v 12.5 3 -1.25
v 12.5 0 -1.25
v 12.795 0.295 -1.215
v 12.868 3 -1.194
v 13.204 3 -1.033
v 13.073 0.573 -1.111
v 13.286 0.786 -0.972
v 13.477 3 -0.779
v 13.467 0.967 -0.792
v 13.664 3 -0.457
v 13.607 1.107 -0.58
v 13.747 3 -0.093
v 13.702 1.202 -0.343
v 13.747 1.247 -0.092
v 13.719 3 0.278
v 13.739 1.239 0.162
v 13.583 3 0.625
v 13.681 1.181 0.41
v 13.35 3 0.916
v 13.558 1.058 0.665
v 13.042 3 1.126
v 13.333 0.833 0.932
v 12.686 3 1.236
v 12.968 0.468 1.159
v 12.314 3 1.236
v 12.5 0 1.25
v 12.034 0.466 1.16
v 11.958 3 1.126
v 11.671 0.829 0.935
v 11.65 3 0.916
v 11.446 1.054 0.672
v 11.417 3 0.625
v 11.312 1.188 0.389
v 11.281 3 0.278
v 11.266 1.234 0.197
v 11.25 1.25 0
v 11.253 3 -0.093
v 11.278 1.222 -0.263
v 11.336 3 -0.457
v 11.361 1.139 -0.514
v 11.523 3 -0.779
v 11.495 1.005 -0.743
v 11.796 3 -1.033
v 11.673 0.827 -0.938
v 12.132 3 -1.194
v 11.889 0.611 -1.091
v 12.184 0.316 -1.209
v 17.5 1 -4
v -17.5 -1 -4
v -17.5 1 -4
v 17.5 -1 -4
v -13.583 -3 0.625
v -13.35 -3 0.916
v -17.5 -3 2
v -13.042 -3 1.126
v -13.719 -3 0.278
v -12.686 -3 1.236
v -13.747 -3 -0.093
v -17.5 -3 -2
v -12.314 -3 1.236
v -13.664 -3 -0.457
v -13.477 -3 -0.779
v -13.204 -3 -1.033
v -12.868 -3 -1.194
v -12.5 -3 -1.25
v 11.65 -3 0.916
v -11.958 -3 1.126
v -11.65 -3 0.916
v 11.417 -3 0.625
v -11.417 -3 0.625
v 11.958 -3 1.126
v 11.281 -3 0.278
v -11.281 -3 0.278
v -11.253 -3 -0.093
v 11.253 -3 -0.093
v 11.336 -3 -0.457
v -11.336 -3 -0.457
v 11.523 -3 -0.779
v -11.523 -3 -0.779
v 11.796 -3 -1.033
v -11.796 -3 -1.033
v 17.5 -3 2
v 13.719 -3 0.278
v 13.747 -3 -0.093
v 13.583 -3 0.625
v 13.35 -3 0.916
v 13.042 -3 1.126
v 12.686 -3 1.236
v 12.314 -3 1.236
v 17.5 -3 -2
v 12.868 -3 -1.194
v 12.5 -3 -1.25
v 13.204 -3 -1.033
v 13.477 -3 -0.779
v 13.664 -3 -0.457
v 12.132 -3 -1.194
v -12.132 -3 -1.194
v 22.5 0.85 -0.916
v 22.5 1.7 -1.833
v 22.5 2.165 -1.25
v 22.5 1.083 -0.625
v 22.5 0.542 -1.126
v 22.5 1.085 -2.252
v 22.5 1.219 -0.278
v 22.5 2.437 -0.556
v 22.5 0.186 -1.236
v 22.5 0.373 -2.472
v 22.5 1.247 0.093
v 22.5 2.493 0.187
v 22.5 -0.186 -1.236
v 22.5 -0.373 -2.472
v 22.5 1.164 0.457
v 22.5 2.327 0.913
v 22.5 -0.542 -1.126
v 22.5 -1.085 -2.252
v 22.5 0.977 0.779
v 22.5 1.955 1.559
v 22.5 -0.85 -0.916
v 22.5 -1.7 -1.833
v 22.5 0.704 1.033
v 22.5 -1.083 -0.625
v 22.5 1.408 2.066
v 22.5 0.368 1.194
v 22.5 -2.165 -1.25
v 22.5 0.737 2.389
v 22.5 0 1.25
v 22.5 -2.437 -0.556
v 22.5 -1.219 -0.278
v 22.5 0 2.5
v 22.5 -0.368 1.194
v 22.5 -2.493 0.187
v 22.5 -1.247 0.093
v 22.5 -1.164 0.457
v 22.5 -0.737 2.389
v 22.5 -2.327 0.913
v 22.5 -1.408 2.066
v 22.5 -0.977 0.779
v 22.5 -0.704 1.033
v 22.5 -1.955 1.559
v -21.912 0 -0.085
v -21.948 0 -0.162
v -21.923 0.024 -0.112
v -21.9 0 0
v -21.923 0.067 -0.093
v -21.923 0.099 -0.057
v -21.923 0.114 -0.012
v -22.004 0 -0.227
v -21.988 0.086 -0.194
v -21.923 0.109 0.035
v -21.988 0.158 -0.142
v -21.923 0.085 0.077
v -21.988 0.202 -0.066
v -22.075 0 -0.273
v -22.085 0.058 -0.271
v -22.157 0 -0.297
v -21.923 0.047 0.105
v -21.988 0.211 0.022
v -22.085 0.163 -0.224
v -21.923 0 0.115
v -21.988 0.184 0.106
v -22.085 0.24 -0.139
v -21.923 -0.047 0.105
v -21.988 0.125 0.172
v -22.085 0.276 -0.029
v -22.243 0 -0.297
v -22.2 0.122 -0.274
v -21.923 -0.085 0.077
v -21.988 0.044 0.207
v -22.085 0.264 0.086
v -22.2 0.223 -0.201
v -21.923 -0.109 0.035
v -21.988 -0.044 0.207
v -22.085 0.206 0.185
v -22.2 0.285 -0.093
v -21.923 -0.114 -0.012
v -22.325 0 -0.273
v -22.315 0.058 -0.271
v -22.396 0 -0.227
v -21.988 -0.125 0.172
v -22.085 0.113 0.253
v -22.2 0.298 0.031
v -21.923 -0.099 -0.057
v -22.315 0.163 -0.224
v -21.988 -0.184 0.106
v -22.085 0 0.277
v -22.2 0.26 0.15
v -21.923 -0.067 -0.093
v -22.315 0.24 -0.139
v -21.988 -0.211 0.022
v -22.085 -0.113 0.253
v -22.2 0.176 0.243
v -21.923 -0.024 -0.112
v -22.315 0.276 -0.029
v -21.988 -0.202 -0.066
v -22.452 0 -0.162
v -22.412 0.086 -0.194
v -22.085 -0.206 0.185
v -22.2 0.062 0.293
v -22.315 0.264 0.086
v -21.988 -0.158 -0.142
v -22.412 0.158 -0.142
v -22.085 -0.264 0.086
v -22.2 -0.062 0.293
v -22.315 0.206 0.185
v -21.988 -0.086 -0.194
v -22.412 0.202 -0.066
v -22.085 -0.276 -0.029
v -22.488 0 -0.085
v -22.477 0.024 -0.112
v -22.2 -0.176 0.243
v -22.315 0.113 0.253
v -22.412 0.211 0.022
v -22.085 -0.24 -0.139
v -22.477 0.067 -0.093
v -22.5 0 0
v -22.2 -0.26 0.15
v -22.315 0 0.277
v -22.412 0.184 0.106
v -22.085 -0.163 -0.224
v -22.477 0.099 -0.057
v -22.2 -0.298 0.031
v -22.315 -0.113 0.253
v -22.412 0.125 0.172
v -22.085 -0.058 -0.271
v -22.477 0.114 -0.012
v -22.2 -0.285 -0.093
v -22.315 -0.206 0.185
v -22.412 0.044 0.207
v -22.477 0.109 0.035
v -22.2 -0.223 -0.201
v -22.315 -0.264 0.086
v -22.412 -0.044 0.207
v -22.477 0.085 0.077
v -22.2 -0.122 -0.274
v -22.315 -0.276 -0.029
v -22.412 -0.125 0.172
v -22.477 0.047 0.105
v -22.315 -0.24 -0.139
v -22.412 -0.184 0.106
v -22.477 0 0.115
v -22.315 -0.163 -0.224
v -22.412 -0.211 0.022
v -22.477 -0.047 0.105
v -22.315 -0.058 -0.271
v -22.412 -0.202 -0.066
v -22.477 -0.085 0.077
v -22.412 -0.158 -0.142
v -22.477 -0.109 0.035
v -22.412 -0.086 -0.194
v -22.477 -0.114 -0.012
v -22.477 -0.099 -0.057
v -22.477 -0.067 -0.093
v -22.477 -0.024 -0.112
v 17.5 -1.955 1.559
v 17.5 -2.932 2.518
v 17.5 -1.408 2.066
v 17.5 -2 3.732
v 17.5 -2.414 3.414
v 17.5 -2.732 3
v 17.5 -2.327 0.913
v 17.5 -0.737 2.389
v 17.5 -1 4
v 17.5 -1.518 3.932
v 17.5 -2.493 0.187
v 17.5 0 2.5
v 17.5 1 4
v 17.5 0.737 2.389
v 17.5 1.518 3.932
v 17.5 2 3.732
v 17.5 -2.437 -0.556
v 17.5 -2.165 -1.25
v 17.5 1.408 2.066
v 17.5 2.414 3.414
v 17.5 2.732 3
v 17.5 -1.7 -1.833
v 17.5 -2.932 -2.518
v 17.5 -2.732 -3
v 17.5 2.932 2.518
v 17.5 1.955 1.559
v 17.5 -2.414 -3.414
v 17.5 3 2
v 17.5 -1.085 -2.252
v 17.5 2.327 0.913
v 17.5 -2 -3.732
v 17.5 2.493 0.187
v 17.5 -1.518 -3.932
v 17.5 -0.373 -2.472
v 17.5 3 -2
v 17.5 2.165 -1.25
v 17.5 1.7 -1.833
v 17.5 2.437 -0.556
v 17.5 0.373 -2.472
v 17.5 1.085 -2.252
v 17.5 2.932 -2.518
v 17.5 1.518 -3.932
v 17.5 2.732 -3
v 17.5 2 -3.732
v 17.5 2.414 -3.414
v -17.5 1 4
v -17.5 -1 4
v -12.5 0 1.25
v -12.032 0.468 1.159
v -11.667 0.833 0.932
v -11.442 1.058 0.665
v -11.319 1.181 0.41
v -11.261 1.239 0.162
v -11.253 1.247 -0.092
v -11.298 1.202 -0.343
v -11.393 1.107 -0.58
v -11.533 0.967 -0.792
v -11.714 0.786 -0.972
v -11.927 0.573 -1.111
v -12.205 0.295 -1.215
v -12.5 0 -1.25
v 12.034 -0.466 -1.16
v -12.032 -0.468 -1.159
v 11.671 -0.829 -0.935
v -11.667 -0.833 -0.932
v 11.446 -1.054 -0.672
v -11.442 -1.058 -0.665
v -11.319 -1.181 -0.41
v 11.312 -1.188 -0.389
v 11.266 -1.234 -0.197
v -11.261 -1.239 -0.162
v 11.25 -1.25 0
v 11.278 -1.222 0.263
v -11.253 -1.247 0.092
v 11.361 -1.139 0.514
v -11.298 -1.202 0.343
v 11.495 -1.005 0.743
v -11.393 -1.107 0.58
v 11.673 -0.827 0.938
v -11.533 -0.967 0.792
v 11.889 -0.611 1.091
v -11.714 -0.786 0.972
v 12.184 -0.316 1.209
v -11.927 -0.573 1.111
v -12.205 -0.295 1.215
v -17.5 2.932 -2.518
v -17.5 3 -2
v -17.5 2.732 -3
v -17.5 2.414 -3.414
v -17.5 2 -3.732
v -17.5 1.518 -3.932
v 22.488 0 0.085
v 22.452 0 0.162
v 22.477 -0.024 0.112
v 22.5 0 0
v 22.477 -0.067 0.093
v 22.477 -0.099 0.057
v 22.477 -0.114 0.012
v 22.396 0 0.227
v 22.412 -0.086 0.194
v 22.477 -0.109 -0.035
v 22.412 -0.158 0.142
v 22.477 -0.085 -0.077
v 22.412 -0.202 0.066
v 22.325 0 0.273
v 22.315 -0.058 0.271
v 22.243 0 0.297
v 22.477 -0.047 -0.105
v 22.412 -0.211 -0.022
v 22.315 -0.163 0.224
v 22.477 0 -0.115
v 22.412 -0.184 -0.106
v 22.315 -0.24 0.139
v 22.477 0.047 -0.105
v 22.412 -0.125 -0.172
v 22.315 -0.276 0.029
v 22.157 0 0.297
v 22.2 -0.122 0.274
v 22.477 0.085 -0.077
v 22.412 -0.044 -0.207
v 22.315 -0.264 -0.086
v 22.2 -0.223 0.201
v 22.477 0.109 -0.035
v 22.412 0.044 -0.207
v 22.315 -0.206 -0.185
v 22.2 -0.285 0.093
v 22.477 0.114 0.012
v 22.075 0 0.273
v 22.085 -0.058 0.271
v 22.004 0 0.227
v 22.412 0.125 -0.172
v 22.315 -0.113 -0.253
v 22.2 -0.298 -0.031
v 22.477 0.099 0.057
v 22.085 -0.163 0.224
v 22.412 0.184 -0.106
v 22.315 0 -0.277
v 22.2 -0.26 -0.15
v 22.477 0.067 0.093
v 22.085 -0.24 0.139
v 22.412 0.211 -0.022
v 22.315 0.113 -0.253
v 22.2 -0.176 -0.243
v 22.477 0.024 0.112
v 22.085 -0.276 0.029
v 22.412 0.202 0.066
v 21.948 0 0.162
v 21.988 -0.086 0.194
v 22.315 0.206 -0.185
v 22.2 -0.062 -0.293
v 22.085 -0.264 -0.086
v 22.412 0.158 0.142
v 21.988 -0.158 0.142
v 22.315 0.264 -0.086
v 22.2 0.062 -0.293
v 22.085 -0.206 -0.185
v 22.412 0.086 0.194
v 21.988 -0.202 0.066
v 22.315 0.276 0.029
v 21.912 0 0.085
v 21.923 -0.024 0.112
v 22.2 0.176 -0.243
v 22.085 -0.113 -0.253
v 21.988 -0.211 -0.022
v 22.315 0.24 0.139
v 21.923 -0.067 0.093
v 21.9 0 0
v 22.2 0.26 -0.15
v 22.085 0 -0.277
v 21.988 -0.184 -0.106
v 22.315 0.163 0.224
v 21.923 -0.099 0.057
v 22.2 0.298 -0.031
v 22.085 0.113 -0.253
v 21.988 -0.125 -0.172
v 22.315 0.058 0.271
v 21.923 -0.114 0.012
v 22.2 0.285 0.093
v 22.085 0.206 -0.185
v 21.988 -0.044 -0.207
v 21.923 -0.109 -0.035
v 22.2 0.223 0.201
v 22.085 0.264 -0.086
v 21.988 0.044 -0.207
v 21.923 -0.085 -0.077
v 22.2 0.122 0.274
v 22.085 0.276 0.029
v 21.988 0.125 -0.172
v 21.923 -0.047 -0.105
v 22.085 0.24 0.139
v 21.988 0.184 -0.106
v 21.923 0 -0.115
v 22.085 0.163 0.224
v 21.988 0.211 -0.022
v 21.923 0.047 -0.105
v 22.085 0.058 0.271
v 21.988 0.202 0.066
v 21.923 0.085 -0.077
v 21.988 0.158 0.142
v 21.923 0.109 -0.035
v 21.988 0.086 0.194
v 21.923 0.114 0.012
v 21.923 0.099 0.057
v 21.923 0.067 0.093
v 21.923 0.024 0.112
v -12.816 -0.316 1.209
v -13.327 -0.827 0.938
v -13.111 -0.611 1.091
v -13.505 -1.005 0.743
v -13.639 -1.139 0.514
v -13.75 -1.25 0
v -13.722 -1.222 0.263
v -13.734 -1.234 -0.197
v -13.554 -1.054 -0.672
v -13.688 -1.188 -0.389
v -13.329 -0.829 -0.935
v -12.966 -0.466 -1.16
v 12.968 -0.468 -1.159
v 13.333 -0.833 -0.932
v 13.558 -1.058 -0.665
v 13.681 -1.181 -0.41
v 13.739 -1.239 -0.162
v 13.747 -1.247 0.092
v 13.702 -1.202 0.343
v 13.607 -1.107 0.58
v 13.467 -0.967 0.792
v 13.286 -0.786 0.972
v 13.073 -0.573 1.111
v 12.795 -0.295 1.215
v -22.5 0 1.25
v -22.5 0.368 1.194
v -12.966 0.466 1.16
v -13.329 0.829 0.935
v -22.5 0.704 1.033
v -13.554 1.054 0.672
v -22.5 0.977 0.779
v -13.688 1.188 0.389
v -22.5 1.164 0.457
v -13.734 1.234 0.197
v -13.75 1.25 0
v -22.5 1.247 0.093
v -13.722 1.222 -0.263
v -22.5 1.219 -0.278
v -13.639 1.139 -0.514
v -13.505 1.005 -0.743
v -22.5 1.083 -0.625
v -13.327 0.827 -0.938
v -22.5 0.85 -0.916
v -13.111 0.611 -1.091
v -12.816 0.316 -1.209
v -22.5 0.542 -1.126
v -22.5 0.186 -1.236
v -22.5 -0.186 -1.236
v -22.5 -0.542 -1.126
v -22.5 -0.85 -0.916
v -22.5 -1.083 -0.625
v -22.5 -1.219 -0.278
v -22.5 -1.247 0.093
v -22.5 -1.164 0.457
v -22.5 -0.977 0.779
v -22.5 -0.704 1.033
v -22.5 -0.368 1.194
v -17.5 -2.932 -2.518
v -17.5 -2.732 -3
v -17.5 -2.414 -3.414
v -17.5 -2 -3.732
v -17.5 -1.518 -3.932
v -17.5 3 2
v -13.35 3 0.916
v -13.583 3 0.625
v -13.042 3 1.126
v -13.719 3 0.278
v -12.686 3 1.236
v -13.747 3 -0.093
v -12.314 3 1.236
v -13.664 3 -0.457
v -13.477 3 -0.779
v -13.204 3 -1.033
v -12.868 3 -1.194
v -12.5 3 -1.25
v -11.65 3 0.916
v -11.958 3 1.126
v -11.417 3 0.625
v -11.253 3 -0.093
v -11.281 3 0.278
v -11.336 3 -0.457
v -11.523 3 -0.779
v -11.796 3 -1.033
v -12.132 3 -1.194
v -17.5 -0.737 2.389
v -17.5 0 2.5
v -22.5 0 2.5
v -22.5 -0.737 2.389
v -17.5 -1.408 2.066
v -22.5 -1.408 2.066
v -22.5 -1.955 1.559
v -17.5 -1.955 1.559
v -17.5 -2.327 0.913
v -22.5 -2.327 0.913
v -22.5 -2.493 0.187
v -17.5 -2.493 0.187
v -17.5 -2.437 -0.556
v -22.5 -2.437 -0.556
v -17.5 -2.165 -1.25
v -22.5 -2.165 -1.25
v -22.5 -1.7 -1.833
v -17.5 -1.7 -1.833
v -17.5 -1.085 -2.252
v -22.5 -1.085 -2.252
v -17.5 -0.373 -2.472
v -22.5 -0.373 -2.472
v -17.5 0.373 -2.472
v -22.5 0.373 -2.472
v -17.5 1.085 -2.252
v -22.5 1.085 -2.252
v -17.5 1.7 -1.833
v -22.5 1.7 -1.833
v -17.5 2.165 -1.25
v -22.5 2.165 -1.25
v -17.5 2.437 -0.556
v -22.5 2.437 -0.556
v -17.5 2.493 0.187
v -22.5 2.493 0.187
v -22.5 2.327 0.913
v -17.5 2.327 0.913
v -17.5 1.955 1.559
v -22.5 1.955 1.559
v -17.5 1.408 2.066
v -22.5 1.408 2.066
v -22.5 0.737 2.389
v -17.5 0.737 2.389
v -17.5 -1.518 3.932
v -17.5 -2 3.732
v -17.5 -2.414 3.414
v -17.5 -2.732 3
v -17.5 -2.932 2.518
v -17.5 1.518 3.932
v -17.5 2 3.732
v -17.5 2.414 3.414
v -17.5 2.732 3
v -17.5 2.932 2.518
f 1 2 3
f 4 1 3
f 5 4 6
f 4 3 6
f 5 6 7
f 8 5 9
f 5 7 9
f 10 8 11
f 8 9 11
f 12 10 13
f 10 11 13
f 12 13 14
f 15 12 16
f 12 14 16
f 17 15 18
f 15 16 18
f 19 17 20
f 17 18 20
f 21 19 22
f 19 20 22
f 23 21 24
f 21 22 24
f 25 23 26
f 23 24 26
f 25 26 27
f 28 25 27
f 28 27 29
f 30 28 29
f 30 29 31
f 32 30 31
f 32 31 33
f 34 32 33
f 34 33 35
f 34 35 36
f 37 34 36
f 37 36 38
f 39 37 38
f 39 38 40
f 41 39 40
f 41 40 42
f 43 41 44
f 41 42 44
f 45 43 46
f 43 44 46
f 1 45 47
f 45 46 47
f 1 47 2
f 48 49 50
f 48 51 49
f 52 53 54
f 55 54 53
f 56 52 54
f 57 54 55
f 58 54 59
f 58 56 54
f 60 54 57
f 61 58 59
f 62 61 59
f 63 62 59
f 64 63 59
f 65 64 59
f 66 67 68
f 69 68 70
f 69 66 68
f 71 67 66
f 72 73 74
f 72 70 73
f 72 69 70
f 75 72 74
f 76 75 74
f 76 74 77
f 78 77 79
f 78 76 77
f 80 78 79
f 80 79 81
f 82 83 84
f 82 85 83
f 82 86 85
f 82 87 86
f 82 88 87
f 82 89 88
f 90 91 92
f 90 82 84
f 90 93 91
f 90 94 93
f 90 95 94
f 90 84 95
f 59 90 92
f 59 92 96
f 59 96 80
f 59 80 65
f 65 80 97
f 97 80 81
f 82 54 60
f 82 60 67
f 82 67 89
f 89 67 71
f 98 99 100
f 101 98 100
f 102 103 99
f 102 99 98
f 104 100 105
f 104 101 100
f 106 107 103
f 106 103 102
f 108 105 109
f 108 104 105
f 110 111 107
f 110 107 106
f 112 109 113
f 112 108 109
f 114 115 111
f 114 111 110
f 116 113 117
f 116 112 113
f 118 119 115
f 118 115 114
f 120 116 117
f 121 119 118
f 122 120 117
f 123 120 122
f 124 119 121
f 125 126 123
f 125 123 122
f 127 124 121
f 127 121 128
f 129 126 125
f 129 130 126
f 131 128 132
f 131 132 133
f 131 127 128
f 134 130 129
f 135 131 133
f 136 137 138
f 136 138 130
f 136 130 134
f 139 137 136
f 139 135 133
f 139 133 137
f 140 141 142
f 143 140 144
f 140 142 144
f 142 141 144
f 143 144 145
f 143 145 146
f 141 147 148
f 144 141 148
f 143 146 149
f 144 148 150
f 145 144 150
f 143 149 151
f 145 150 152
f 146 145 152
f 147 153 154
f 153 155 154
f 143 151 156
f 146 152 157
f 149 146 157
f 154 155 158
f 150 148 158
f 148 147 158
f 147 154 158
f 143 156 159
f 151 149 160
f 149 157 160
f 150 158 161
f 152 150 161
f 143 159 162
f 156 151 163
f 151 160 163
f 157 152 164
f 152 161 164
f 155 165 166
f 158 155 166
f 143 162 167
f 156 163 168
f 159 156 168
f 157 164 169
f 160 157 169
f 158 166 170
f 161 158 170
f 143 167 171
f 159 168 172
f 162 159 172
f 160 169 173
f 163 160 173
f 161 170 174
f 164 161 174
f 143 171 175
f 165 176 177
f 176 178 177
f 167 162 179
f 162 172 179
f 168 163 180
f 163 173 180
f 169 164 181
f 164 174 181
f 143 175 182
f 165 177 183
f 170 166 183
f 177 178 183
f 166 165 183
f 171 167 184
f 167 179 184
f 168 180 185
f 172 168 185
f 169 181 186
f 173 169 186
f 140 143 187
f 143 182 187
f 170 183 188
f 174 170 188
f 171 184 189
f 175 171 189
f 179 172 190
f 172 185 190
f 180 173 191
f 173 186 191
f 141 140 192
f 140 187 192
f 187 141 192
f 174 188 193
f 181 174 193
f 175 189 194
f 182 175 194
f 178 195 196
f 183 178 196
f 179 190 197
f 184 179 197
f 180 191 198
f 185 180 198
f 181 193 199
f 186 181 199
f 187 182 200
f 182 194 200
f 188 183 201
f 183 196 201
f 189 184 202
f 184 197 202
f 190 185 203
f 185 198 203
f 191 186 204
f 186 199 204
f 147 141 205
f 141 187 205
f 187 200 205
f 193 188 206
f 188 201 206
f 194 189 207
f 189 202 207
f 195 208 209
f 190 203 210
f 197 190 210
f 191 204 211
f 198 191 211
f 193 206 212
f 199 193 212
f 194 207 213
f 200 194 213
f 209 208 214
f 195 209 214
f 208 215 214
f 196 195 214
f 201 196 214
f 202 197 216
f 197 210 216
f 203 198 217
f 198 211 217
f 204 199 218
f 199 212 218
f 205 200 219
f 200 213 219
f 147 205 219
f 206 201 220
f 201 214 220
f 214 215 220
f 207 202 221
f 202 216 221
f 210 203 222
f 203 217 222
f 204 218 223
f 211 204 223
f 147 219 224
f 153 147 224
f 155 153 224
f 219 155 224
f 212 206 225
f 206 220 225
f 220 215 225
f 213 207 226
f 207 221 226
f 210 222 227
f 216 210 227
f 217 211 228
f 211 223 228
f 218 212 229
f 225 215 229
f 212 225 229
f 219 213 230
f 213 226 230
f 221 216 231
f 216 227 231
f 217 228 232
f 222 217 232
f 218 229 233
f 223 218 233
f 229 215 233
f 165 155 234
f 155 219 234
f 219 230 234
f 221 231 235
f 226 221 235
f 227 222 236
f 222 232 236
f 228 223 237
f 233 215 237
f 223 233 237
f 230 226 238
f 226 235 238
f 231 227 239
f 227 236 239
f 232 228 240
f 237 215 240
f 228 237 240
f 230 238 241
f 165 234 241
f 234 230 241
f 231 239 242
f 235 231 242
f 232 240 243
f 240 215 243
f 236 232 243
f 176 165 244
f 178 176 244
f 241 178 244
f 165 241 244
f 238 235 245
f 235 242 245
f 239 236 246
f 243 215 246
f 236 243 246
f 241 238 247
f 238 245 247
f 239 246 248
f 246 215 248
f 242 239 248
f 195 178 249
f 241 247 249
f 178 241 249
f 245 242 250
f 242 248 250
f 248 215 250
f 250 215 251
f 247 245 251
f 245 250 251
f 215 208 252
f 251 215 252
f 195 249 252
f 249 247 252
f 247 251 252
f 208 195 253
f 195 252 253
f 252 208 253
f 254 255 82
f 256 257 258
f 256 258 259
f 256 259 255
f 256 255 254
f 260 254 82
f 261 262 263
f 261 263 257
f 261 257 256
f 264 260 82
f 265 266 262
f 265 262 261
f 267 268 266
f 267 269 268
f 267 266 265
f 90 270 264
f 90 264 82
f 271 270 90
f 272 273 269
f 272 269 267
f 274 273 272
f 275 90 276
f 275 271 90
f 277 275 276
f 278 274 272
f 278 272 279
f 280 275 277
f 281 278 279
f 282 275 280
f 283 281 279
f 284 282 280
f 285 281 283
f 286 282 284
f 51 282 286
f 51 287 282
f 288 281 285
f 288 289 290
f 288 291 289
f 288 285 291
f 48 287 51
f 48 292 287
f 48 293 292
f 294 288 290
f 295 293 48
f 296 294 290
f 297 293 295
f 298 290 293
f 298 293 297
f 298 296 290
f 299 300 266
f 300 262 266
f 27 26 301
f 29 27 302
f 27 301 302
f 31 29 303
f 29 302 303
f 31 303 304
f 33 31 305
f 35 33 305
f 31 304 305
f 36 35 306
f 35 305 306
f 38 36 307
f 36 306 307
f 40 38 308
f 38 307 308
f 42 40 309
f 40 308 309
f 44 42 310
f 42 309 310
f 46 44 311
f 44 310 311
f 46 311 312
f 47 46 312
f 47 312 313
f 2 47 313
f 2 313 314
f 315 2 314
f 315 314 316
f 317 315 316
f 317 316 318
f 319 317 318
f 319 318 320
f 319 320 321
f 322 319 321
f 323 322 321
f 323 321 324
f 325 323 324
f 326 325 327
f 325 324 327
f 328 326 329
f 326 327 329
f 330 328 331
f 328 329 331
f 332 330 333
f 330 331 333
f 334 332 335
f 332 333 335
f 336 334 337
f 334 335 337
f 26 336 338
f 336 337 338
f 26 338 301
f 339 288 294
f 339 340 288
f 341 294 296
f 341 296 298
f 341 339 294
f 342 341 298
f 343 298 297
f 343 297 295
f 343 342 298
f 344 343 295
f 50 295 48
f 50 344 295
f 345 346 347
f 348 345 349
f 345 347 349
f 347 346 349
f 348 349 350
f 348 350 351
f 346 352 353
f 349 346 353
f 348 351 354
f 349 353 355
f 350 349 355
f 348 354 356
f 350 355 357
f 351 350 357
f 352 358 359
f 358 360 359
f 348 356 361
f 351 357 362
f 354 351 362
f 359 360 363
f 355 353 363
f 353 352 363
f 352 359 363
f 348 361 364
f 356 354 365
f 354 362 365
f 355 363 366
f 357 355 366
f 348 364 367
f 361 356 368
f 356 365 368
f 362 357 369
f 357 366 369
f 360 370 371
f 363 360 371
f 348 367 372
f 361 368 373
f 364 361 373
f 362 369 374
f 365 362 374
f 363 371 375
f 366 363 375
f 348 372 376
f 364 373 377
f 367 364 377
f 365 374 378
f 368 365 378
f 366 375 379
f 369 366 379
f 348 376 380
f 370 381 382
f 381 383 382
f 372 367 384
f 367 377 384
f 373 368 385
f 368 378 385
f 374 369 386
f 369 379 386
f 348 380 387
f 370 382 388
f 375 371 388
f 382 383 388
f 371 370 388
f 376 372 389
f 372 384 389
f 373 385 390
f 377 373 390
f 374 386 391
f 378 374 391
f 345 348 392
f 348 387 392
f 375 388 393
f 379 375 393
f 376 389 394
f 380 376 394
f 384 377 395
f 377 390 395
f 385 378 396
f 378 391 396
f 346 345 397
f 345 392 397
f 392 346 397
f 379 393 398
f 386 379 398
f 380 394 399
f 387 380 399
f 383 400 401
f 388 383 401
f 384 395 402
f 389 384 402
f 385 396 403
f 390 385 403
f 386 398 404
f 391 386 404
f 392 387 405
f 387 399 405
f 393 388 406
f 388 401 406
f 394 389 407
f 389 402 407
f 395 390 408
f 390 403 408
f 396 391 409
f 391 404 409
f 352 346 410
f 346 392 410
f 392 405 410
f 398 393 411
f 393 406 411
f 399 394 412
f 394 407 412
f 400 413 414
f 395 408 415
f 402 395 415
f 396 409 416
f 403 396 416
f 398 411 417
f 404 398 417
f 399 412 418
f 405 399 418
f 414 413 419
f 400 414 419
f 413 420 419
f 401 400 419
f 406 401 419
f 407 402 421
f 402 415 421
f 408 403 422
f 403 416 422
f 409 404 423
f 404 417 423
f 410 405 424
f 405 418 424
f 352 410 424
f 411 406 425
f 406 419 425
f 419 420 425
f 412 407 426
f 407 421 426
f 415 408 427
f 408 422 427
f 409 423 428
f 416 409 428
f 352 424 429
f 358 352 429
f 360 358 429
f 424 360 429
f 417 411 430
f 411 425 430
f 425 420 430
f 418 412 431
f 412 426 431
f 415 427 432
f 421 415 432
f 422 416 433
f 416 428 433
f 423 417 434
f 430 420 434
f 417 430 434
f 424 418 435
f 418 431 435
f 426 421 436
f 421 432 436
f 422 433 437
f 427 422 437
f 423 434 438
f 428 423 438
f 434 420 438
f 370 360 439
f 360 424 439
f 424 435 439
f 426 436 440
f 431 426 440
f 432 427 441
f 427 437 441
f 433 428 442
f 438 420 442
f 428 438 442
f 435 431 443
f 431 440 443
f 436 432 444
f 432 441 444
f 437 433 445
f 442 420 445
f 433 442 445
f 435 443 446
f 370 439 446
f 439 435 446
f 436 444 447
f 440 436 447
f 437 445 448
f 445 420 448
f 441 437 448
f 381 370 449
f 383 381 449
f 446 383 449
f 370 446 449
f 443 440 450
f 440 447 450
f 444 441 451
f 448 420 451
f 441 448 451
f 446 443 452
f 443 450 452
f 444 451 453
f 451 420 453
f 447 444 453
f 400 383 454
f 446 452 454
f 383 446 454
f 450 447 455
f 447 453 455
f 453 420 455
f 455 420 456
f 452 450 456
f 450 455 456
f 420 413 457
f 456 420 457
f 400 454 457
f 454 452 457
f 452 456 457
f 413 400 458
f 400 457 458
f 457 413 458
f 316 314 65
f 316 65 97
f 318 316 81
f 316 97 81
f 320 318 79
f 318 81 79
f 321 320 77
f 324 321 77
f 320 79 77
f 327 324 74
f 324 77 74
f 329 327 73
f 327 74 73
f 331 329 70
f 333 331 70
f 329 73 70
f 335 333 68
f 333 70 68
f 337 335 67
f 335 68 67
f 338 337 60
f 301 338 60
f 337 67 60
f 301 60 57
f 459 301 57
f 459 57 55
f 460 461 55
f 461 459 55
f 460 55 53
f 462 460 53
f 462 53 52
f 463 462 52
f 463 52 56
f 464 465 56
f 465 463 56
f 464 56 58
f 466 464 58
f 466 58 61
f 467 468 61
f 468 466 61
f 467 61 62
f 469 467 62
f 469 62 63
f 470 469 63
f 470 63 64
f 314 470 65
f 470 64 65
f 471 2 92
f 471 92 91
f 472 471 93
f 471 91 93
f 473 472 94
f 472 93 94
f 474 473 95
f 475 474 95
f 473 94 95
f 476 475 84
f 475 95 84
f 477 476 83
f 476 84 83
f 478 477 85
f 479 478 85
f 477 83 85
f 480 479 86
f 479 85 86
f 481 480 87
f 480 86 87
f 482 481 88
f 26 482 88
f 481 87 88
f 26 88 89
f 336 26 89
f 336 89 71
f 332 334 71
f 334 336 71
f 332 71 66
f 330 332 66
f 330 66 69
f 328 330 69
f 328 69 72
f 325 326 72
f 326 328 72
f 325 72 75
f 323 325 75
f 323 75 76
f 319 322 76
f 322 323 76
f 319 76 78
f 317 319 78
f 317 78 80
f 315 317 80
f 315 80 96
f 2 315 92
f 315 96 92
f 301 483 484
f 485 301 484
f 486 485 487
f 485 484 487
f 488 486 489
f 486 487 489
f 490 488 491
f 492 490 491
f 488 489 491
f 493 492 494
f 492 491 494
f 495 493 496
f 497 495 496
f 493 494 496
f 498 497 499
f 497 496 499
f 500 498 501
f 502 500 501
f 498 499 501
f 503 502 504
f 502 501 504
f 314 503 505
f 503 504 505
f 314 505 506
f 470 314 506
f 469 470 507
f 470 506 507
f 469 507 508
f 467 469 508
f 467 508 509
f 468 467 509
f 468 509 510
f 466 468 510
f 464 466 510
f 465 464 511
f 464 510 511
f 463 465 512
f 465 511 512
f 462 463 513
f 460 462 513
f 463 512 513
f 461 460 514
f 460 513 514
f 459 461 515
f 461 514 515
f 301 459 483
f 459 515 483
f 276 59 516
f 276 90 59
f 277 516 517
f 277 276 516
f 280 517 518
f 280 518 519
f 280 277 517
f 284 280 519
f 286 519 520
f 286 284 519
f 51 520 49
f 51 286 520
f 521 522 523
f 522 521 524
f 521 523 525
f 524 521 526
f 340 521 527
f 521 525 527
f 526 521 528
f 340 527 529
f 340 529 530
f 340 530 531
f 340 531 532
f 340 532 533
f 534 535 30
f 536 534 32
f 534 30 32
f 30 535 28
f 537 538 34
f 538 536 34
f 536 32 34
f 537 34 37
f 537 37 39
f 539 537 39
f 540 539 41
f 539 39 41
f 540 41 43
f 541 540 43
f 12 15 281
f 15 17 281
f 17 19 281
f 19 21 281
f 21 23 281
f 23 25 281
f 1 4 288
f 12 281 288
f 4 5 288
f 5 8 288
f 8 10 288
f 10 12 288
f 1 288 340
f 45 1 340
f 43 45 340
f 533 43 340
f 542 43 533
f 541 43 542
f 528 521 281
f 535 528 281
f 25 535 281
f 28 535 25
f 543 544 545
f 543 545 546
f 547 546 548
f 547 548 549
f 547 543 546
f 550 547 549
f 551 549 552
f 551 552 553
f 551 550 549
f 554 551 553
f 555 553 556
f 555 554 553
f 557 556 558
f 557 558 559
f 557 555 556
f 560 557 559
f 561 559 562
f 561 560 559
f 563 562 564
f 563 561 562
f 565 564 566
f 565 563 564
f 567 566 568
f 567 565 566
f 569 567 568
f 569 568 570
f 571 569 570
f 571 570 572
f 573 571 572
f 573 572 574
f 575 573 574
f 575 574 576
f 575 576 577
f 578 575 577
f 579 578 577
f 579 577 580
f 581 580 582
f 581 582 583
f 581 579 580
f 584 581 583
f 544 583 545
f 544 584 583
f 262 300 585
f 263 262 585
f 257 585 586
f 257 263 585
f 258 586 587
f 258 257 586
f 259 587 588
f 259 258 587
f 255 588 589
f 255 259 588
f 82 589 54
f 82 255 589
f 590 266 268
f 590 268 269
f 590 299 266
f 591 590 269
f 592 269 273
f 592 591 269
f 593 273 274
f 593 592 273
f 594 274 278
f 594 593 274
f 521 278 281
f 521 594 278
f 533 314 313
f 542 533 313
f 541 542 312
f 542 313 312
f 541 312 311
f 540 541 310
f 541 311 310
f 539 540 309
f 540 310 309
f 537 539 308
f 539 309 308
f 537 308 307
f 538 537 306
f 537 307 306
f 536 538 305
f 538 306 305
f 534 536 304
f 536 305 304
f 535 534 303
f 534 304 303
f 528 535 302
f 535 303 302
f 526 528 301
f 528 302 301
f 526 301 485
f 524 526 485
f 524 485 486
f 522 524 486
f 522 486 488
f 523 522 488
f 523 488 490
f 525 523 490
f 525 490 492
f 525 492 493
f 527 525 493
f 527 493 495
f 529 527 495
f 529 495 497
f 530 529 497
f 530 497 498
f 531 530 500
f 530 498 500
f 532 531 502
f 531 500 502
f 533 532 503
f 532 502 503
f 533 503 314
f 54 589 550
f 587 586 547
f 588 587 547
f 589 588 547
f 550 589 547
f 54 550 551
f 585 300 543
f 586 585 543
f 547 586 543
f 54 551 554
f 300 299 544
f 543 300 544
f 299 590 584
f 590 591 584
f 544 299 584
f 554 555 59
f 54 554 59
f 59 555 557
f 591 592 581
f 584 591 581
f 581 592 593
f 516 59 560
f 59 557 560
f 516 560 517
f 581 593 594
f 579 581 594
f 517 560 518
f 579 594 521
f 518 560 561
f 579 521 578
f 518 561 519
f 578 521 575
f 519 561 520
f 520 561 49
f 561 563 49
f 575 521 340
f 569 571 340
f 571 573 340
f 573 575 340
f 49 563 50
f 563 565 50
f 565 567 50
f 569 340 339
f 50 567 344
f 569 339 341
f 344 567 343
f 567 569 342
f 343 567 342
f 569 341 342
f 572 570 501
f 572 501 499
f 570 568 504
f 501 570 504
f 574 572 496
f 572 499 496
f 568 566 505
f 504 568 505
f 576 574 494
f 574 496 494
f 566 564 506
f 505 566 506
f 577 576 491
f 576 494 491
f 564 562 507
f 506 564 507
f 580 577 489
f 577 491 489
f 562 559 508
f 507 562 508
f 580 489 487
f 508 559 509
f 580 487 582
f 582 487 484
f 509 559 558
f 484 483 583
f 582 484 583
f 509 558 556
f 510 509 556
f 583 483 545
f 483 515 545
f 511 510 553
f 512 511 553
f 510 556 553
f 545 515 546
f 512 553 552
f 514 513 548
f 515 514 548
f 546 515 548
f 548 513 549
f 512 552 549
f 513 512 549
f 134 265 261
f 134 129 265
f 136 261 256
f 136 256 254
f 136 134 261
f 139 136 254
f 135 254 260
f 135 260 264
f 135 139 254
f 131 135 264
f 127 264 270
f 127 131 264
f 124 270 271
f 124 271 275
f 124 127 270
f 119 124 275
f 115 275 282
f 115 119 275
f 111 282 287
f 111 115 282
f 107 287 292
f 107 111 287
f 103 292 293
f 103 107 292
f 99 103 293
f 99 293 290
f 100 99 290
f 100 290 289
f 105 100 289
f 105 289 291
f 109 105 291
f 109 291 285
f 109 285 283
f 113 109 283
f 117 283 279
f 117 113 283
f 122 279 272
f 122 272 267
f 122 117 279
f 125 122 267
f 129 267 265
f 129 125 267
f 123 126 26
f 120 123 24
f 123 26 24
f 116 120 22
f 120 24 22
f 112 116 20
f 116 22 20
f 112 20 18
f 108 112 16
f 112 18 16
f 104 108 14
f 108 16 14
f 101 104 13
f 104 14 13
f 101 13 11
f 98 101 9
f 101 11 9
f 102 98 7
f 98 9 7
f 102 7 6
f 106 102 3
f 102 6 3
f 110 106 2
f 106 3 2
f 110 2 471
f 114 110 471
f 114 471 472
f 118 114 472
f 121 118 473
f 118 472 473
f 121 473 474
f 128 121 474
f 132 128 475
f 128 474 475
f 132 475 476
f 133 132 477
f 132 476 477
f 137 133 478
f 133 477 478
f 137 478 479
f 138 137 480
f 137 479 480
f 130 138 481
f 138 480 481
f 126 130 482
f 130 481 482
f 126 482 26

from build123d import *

# Parameters (mm, degrees)
SKETCH_1_W          = 8
SKETCH_1_H          = 6
EXTRUDE_1_DEPTH     = 17.5
SKETCH_2_R          = 2.5
EXTRUDE_2_DEPTH     = 22.5
FILLET_1_R          = 2
HOLE_WIZARD_M3_1_D  = 2.5
SKETCH_6_R          = 1
CUT_EXTRUDE_1_DEPTH = 24.627314701
HOLE_WIZARD_M3_2_D  = 2.5


with BuildPart() as part:
    # 草圖1 → 填料-伸長1 (new, symmetric)
    with BuildSketch(Plane(origin=(0, 0, 0), x_dir=(0, 0, -1), z_dir=(1, 0, 0))):
        Rectangle(SKETCH_1_W, SKETCH_1_H)
    extrude(amount=EXTRUDE_1_DEPTH, both=True)

    # 草圖2 → 填料-伸長2 (add, symmetric)
    with BuildSketch(Plane(origin=(0, 0, 0), x_dir=(0, 0, -1), z_dir=(1, 0, 0))):
        with Locations(Location((0, 0, 0), (0, 0, 180))):
            Circle(SKETCH_2_R)
    extrude(amount=EXTRUDE_2_DEPTH, both=True)

    # 圓角1
    fillet_1_edges = [part.edges().sort_by_distance(p)[0] for p in [
        (0, 3, 4),
        (0, 3, -4),
        (0, -3, -4),
        (0, -3, 4),
    ]]
    fillet(fillet_1_edges, radius=FILLET_1_R)

    # M3 螺紋孔1 (through all)
    with Locations(Plane(origin=(22.5, 0, 0), x_dir=(0, 0, -1), z_dir=(1, 0, 0))):
        with Locations((0, 0)):
            Hole(HOLE_WIZARD_M3_1_D / 2)

    # 草圖6 → 除料-伸長1 (cut, through all)
    with BuildSketch(Plane(origin=(0, 3, 0), x_dir=(1, 0, 0), z_dir=(0, 1, 0))):
        with Locations(Location((-12.5, 0, 0), (0, 0, 270))):
            Circle(SKETCH_6_R)
        with Locations(Location((12.5, 0, 0), (0, 0, 270))):
            Circle(SKETCH_6_R)
    extrude(amount=-CUT_EXTRUDE_1_DEPTH, mode=Mode.SUBTRACT)

    # M3 螺紋孔2 (through all)
    with Locations(Plane(origin=(-12.5, 3, 0), x_dir=(0, 0, 1), z_dir=(0, 1, 0))):
        with Locations((0, 0), (0, 25)):
            Hole(HOLE_WIZARD_M3_2_D / 2)


with BuildPart() as body_2:
    # 草圖10 → 旋轉1 (revolve)
    with BuildSketch(Plane(origin=(0, 0, 0), x_dir=(1, 0, 0), z_dir=(0, 1, 0))):
        with BuildLine():
            Line((21.9, 0), (22.5, 0))
            ThreePointArc((22.5, 0), (22.2, -0.3), (21.9, 0))
        make_face()
        with BuildLine():
            Line((-22.5, 0), (-21.9, 0))
            ThreePointArc((-21.9, 0), (-22.2, 0.3), (-22.5, 0))
        make_face()
    revolve(axis=Axis((-22.5, 0, 0), (1, 0, 0)))


solid = Compound([part.part, body_2.part])
